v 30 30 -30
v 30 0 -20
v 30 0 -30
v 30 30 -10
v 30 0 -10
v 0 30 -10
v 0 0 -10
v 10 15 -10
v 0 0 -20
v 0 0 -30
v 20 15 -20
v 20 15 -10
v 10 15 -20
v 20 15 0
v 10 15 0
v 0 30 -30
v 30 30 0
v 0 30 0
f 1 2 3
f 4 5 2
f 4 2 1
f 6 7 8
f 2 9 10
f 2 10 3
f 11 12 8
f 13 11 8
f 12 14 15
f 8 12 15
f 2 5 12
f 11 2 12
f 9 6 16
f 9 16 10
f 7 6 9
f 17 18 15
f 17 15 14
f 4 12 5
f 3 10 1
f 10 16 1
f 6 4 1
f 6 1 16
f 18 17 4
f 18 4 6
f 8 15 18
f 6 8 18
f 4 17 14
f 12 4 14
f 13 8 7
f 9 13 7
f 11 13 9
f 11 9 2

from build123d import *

# Parameters (mm, degrees)
F1_DEPTH = 30
F2_DEPTH = 20
F3_DEPTH = 10


with BuildPart() as f1:
    # F0 (on Top) → F1 (new body)
    with BuildSketch(Plane.XY):
        Polygon((10, 15), (0, 0), (30, 0), (20, 15), align=None)
        Polygon((0, 30), (0, 0), (10, 15), align=None)
        Polygon((20, 15), (30, 0), (30, 30), align=None)
        Polygon((30, 30), (0, 30), (10, 15), (20, 15), align=None)
    extrude(amount=-F1_DEPTH)

    # F0 (on Top) → F2 (cut)
    with BuildSketch(Plane.XY):
        Polygon((10, 15), (0, 0), (30, 0), (20, 15), align=None)
    extrude(amount=-F2_DEPTH, mode=Mode.SUBTRACT)

    # F0 (on Top) → F3 (cut)
    with BuildSketch(Plane.XY):
        Polygon((0, 30), (0, 0), (10, 15), align=None)
        Polygon((20, 15), (30, 0), (30, 30), align=None)
    extrude(amount=-F3_DEPTH, mode=Mode.SUBTRACT)


solid = f1.part
